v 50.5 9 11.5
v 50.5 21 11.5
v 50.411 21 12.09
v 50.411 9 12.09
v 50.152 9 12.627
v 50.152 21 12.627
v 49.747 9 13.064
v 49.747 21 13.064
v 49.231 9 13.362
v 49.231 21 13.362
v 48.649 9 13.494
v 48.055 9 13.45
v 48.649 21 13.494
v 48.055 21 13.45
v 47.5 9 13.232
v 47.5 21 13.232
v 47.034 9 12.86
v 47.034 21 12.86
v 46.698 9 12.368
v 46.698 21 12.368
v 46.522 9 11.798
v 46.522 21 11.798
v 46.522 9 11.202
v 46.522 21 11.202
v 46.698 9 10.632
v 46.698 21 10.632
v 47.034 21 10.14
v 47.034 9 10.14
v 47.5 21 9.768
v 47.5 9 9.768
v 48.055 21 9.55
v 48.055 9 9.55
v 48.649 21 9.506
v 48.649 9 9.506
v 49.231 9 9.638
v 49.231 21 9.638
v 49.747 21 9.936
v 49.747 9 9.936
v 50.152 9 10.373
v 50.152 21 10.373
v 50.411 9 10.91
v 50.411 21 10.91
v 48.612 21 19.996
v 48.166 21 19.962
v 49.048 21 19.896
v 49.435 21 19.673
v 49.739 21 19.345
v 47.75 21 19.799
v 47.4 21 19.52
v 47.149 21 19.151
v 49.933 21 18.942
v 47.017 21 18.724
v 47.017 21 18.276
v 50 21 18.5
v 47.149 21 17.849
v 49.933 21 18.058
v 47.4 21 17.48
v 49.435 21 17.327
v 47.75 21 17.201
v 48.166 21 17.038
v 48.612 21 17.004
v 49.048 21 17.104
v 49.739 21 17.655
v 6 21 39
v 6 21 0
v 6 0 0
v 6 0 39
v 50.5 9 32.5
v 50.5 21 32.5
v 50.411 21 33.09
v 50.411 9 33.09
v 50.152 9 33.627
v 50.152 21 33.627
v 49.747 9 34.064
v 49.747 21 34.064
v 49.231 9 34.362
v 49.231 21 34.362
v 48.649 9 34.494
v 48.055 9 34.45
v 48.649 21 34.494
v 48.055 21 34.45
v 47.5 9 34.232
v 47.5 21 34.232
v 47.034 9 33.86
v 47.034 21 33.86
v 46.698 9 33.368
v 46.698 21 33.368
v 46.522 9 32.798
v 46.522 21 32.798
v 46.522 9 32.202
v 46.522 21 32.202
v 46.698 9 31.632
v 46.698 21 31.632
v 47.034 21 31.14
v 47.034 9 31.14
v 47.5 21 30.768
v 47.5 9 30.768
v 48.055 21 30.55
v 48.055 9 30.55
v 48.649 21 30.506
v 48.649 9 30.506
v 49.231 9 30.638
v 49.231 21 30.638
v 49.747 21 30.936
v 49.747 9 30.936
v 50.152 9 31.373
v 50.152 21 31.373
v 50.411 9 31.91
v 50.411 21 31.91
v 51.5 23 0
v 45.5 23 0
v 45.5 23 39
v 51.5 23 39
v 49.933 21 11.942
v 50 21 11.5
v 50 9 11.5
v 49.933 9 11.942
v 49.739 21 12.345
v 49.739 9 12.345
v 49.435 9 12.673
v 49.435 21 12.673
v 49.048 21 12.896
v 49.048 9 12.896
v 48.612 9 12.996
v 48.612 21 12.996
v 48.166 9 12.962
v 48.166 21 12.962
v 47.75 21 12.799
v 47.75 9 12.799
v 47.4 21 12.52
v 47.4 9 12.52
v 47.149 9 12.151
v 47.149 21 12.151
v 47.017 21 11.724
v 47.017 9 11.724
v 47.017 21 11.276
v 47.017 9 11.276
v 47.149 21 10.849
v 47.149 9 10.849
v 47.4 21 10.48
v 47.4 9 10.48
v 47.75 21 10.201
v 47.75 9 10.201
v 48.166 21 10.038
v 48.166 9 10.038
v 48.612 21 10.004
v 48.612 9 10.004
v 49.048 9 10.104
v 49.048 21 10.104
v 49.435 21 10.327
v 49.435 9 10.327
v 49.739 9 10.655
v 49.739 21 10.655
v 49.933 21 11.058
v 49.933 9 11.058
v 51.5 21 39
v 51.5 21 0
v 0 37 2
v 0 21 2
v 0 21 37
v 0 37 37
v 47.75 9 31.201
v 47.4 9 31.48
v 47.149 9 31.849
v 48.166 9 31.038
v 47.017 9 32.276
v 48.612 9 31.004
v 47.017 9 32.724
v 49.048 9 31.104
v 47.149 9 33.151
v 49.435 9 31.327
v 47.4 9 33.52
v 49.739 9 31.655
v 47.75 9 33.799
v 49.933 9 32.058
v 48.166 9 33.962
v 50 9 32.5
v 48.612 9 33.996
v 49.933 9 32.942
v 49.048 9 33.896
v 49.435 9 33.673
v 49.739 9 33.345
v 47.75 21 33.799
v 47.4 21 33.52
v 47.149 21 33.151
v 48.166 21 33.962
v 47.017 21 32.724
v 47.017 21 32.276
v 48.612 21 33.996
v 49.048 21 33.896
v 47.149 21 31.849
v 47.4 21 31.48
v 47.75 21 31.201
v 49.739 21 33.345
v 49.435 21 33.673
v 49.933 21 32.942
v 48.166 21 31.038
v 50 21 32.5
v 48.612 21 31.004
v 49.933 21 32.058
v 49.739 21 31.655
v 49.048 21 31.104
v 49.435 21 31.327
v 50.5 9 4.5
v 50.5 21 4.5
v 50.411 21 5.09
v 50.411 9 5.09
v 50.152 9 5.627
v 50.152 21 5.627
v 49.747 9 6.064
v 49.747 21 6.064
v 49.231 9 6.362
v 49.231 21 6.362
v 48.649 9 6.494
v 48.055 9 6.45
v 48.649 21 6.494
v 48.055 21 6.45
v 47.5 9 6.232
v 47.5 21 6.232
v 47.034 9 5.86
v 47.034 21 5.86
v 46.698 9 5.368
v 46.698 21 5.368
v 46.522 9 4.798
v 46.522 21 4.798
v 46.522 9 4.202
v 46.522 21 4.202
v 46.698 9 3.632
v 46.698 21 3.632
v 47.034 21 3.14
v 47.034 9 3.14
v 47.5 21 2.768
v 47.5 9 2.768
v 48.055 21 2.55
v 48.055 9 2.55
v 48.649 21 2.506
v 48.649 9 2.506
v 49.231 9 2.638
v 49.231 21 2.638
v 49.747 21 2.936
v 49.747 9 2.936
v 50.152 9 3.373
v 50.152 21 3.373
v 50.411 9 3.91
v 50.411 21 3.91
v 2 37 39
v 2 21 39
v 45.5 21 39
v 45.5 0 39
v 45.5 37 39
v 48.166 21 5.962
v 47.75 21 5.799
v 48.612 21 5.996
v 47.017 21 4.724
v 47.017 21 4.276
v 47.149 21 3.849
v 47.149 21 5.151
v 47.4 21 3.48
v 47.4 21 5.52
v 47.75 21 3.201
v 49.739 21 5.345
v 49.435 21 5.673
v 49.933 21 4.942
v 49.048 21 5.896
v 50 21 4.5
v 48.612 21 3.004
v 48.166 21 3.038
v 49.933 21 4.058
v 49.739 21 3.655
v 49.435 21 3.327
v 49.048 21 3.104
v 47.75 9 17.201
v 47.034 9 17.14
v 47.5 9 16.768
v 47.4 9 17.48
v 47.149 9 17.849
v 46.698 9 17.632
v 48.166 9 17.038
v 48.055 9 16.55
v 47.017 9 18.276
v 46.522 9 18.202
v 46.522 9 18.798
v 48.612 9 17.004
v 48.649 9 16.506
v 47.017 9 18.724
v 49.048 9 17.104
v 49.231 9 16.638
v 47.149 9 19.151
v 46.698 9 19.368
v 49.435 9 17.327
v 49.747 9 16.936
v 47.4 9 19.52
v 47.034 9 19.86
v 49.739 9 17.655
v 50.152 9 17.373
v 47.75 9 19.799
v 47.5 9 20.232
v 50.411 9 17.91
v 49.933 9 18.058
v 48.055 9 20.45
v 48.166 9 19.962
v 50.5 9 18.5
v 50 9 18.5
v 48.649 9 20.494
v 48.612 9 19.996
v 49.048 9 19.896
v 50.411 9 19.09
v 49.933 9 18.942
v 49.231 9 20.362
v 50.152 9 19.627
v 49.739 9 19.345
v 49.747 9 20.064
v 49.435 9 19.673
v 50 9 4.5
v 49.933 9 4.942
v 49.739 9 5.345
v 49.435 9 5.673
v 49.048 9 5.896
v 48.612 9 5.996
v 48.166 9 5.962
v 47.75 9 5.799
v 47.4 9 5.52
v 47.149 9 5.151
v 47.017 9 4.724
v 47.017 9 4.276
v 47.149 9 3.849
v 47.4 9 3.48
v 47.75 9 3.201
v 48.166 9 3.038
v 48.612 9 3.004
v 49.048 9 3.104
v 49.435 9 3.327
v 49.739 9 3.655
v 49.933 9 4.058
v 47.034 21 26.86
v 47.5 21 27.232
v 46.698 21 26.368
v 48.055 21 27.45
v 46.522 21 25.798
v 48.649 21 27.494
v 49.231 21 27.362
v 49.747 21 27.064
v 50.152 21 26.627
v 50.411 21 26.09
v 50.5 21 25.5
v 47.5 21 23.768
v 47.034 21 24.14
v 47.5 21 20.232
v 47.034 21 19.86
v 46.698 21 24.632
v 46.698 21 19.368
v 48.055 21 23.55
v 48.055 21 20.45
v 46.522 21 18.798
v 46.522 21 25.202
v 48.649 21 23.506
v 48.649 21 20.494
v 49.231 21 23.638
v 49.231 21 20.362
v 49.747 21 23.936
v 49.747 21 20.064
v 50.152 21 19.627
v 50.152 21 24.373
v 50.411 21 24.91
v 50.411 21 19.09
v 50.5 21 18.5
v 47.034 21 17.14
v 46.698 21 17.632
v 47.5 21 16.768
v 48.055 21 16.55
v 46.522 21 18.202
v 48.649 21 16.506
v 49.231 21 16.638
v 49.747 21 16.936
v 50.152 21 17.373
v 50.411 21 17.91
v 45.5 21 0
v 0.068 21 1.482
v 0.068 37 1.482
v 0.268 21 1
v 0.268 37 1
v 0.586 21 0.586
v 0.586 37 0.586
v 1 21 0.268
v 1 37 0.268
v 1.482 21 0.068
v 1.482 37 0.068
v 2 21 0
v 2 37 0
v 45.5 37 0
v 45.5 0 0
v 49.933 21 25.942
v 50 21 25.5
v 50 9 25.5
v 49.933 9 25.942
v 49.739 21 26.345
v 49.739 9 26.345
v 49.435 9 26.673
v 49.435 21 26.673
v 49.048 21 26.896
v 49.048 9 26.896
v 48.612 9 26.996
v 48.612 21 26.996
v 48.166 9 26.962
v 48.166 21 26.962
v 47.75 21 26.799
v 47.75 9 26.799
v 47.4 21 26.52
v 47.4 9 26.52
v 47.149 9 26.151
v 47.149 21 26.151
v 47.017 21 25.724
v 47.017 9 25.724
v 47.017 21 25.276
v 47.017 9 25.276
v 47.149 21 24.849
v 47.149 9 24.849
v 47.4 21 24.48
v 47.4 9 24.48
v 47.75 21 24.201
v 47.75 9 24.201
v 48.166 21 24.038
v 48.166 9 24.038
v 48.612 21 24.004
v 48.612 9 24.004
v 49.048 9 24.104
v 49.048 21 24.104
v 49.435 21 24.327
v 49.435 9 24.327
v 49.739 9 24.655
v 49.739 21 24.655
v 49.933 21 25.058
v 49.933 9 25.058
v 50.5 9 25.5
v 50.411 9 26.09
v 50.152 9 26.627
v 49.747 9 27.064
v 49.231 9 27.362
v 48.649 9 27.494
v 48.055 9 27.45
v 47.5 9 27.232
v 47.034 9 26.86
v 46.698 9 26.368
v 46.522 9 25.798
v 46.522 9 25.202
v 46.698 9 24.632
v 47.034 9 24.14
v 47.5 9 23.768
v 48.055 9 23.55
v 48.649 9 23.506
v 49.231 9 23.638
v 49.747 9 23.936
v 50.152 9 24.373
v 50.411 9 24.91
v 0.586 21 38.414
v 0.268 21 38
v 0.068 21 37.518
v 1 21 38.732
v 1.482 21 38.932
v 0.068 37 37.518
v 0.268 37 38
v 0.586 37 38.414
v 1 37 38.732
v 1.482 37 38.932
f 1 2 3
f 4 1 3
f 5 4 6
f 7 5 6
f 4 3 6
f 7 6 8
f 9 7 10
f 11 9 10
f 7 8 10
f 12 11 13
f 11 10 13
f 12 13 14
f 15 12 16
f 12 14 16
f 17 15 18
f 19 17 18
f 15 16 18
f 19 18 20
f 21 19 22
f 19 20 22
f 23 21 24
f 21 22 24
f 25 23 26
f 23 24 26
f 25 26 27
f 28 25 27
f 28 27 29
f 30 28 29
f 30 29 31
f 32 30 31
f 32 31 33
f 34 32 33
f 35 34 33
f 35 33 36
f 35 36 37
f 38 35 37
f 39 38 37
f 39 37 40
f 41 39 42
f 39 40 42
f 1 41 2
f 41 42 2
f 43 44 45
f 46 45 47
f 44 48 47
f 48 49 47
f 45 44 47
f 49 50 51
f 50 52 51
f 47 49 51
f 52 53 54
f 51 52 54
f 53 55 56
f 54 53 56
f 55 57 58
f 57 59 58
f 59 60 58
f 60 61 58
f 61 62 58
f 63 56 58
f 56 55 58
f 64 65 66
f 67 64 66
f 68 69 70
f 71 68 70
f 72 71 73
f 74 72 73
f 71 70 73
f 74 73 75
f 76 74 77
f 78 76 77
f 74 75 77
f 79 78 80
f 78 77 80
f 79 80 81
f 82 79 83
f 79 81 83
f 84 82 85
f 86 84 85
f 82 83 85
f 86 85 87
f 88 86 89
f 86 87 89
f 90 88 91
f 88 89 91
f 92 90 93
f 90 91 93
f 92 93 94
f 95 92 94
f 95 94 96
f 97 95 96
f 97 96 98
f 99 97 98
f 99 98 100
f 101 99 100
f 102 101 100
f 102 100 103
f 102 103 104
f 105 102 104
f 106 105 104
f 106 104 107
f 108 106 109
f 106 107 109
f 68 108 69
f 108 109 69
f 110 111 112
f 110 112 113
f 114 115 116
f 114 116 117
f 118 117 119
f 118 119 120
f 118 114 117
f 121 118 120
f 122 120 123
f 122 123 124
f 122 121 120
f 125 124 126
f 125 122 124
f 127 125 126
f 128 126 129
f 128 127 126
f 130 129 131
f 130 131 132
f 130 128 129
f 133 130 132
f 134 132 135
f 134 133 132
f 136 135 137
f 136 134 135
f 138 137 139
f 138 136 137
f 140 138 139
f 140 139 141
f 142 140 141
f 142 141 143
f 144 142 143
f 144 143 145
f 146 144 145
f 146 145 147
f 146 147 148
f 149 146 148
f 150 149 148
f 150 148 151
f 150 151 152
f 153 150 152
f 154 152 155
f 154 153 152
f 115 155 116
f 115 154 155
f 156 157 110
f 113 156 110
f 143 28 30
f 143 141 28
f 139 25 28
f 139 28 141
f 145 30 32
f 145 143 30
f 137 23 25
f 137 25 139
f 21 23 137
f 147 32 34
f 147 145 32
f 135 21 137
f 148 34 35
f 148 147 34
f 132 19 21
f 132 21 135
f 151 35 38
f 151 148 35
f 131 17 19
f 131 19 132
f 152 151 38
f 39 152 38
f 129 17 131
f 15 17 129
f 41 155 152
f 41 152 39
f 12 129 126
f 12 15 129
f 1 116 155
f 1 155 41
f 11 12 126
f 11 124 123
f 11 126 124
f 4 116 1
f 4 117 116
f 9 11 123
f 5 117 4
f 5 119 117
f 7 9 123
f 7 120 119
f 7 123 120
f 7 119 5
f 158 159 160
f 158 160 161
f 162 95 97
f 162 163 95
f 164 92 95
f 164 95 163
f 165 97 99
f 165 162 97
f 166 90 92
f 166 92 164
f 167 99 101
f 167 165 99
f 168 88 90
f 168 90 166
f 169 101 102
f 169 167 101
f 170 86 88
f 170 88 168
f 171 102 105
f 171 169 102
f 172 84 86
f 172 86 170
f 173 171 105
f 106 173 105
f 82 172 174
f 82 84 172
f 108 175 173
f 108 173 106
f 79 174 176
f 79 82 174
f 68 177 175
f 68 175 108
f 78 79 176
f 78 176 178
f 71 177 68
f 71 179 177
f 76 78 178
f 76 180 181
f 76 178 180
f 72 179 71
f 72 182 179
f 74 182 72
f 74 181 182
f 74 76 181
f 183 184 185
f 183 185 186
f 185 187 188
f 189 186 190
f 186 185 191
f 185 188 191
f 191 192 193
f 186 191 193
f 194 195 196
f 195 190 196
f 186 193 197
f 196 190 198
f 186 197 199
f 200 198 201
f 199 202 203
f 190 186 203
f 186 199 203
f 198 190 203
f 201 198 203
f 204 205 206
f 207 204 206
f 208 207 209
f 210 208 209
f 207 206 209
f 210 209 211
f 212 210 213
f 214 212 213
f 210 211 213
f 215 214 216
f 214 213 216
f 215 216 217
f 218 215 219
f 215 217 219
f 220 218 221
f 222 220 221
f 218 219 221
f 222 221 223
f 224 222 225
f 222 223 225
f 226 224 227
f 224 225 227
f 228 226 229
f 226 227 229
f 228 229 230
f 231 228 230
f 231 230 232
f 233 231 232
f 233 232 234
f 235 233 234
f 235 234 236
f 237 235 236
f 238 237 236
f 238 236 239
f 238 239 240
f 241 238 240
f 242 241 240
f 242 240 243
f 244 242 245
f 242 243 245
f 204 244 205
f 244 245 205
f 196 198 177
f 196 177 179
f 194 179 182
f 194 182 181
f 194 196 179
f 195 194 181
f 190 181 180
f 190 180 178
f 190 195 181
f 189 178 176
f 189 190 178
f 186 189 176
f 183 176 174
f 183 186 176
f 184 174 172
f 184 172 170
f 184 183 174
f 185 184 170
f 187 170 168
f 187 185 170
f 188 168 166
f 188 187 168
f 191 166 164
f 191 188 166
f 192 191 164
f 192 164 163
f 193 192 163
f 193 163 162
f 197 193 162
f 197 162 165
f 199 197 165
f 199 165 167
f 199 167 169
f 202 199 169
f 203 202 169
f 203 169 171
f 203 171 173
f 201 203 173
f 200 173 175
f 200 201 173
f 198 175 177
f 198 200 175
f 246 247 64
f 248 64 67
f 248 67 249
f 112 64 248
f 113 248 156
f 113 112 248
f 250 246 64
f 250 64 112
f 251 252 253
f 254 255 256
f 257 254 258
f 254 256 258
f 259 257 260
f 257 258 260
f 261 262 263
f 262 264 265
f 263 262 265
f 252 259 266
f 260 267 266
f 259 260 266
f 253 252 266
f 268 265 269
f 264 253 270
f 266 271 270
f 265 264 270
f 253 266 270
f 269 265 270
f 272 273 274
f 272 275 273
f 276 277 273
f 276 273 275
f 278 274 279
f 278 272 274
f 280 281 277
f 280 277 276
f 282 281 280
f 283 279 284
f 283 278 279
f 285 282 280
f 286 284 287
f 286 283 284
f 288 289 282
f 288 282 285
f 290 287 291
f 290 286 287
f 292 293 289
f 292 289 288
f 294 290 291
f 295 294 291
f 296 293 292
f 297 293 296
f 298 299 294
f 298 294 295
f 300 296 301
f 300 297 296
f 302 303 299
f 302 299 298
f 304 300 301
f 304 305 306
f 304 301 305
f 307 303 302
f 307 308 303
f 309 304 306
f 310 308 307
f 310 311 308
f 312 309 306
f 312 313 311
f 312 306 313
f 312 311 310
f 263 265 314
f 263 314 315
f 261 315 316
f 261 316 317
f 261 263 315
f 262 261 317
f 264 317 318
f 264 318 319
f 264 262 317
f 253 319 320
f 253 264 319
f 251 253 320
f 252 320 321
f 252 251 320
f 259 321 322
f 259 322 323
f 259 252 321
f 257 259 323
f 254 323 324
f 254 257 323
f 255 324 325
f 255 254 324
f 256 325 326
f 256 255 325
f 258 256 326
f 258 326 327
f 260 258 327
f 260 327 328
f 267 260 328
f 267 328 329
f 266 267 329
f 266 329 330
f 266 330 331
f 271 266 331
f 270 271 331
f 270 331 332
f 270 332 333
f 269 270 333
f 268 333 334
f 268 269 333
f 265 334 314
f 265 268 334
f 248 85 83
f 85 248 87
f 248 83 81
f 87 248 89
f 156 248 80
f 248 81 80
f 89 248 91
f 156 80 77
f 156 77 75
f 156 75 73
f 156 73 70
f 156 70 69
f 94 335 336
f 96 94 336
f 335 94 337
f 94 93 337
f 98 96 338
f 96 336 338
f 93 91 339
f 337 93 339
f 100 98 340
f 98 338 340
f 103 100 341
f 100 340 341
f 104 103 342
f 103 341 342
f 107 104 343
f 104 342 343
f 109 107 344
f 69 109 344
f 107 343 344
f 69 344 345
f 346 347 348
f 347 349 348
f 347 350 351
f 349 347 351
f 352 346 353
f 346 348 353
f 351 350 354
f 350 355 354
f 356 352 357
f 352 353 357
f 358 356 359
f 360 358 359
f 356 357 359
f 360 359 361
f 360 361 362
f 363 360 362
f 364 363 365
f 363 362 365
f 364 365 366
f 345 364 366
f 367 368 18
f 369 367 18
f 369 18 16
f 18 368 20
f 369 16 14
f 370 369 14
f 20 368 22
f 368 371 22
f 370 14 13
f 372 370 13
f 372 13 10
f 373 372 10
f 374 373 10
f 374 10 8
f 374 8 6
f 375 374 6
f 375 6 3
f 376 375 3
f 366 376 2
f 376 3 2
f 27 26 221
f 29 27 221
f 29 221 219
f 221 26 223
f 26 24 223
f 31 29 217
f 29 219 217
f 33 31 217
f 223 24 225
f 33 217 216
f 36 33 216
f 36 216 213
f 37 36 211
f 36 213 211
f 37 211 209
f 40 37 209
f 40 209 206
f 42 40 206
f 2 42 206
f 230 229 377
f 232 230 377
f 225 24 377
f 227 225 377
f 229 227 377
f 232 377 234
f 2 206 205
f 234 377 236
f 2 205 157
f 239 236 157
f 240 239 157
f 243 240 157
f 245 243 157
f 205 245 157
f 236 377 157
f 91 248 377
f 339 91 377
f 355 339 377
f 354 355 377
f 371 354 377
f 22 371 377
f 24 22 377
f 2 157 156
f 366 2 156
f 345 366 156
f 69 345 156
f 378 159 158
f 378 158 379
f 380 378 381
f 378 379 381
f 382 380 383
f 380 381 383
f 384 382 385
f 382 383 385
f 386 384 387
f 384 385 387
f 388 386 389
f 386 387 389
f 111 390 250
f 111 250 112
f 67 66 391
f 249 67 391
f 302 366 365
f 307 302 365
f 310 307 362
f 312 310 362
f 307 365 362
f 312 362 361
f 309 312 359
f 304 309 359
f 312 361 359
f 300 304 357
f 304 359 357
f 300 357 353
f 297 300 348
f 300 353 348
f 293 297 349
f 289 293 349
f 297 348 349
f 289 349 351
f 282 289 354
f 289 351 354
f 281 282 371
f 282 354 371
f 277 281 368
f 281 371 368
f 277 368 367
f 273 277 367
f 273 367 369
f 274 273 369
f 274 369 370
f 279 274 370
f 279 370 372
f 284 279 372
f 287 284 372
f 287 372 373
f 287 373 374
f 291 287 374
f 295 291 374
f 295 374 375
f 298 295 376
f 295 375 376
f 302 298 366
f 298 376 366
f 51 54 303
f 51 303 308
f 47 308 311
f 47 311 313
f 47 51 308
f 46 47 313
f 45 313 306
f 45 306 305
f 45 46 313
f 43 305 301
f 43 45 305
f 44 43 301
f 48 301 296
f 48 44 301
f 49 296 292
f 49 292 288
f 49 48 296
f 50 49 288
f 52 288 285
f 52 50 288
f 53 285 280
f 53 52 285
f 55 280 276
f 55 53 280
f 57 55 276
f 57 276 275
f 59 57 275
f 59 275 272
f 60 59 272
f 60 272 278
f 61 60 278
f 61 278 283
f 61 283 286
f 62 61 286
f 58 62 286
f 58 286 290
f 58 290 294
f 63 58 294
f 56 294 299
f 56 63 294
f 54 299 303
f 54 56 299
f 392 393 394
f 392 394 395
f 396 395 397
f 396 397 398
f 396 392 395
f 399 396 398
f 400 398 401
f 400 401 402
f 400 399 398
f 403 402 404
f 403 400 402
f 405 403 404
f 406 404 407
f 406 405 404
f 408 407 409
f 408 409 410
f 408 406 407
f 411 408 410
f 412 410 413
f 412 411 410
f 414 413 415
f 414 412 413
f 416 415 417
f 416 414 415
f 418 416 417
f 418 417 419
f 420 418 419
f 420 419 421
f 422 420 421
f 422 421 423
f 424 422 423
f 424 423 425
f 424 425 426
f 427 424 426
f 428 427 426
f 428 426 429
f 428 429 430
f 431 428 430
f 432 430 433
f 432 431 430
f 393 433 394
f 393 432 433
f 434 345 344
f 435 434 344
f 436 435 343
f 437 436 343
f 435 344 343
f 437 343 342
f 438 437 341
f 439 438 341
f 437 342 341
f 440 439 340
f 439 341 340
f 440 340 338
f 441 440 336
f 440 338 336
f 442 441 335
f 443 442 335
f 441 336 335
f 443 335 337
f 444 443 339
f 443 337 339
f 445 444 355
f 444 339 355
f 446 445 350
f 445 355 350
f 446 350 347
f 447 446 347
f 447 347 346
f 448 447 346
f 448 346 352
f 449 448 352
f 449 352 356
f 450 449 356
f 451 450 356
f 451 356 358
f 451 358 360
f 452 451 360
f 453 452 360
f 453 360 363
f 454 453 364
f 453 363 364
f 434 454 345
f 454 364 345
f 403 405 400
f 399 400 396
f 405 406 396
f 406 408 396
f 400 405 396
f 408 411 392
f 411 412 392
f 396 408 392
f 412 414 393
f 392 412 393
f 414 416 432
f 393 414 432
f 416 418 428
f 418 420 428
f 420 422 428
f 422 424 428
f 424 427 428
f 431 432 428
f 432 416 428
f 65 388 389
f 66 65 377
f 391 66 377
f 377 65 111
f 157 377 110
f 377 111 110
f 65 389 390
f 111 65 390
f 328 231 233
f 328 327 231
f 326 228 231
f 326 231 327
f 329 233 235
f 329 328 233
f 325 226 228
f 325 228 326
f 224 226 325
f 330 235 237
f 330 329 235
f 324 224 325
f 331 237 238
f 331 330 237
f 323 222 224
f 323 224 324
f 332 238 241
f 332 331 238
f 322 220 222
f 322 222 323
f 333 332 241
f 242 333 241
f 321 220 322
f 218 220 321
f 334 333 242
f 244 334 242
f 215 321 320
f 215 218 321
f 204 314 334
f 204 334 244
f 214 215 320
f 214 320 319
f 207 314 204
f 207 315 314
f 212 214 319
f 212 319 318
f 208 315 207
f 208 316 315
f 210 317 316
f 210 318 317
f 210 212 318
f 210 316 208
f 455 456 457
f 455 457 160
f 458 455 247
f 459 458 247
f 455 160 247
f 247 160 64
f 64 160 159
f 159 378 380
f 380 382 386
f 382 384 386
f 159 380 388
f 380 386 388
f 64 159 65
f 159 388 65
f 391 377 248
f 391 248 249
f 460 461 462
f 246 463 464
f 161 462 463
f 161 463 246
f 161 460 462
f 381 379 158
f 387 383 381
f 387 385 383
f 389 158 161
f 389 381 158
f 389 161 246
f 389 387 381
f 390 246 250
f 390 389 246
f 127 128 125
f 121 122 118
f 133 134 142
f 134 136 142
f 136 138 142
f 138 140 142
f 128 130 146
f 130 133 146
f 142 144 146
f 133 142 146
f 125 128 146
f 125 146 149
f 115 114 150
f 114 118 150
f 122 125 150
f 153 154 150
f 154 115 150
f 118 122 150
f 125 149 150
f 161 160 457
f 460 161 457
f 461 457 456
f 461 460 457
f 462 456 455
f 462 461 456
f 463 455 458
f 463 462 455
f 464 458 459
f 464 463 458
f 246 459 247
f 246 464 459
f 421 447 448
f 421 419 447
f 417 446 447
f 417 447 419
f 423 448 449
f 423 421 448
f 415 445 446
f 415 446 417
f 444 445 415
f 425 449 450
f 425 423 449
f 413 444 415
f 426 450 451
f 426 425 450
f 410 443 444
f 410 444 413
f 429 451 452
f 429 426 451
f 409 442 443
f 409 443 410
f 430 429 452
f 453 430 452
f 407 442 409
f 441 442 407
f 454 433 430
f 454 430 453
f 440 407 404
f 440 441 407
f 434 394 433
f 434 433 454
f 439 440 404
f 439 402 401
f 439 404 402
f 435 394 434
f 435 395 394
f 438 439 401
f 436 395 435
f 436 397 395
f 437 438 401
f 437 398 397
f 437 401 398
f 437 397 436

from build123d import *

# Parameters (mm, degrees)
F0_W     = 51.5
F0_H     = 37
F1_DEPTH = 39
F2_W     = 6
F2_H     = 21
F2_H_2   = 14
F3_DEPTH = 39.001
F4_R     = 2
F4_R_2   = 1.5
F5_DEPTH = 12
F6_R     = 2


with BuildPart() as f1:
    # F0 (on Top) → F1 (new body)
    with BuildSketch(Plane.XY):
        with Locations((25.75, 18.5)):
            Rectangle(F0_W, F0_H)
    extrude(amount=F1_DEPTH)

    # F2 (on face) → F3 (cut, through all)
    with BuildSketch(Plane(origin=(0, 0, 0), x_dir=(1, 0, 0), z_dir=(0, 0, -1))):
        with Locations((3, -10.5)):
            Rectangle(F2_W, F2_H)
        with Locations((48.5, -10.5)):
            Rectangle(F2_W, F2_H)
        with Locations((48.5, -30)):
            Rectangle(F2_W, F2_H_2)
    extrude(amount=-F3_DEPTH, mode=Mode.SUBTRACT)

    # F4 (on face) → F5 (join)
    with BuildSketch(Plane.XZ.offset(-21)):
        with Locations((48.5, 4.5)):
            Circle(F4_R)
        with Locations((48.5, 4.5)):
            Circle(F4_R_2, mode=Mode.SUBTRACT)
        with Locations((48.5, 11.5)):
            Circle(F4_R)
        with Locations((48.5, 11.5)):
            Circle(F4_R_2, mode=Mode.SUBTRACT)
        with Locations((48.5, 18.5)):
            Circle(F4_R)
        with Locations((48.5, 18.5)):
            Circle(F4_R_2, mode=Mode.SUBTRACT)
        with Locations((48.5, 25.5)):
            Circle(F4_R)
        with Locations((48.5, 25.5)):
            Circle(F4_R_2, mode=Mode.SUBTRACT)
        with Locations((48.5, 32.5)):
            Circle(F4_R)
        with Locations((48.5, 32.5)):
            Circle(F4_R_2, mode=Mode.SUBTRACT)
    extrude(amount=F5_DEPTH)

    # F6
    f6_edges = [f1.edges().sort_by_distance(p)[0] for p in [
        (0, 29, 0),
        (0, 29, 39),
    ]]
    fillet(f6_edges, radius=F6_R)


solid = f1.part
